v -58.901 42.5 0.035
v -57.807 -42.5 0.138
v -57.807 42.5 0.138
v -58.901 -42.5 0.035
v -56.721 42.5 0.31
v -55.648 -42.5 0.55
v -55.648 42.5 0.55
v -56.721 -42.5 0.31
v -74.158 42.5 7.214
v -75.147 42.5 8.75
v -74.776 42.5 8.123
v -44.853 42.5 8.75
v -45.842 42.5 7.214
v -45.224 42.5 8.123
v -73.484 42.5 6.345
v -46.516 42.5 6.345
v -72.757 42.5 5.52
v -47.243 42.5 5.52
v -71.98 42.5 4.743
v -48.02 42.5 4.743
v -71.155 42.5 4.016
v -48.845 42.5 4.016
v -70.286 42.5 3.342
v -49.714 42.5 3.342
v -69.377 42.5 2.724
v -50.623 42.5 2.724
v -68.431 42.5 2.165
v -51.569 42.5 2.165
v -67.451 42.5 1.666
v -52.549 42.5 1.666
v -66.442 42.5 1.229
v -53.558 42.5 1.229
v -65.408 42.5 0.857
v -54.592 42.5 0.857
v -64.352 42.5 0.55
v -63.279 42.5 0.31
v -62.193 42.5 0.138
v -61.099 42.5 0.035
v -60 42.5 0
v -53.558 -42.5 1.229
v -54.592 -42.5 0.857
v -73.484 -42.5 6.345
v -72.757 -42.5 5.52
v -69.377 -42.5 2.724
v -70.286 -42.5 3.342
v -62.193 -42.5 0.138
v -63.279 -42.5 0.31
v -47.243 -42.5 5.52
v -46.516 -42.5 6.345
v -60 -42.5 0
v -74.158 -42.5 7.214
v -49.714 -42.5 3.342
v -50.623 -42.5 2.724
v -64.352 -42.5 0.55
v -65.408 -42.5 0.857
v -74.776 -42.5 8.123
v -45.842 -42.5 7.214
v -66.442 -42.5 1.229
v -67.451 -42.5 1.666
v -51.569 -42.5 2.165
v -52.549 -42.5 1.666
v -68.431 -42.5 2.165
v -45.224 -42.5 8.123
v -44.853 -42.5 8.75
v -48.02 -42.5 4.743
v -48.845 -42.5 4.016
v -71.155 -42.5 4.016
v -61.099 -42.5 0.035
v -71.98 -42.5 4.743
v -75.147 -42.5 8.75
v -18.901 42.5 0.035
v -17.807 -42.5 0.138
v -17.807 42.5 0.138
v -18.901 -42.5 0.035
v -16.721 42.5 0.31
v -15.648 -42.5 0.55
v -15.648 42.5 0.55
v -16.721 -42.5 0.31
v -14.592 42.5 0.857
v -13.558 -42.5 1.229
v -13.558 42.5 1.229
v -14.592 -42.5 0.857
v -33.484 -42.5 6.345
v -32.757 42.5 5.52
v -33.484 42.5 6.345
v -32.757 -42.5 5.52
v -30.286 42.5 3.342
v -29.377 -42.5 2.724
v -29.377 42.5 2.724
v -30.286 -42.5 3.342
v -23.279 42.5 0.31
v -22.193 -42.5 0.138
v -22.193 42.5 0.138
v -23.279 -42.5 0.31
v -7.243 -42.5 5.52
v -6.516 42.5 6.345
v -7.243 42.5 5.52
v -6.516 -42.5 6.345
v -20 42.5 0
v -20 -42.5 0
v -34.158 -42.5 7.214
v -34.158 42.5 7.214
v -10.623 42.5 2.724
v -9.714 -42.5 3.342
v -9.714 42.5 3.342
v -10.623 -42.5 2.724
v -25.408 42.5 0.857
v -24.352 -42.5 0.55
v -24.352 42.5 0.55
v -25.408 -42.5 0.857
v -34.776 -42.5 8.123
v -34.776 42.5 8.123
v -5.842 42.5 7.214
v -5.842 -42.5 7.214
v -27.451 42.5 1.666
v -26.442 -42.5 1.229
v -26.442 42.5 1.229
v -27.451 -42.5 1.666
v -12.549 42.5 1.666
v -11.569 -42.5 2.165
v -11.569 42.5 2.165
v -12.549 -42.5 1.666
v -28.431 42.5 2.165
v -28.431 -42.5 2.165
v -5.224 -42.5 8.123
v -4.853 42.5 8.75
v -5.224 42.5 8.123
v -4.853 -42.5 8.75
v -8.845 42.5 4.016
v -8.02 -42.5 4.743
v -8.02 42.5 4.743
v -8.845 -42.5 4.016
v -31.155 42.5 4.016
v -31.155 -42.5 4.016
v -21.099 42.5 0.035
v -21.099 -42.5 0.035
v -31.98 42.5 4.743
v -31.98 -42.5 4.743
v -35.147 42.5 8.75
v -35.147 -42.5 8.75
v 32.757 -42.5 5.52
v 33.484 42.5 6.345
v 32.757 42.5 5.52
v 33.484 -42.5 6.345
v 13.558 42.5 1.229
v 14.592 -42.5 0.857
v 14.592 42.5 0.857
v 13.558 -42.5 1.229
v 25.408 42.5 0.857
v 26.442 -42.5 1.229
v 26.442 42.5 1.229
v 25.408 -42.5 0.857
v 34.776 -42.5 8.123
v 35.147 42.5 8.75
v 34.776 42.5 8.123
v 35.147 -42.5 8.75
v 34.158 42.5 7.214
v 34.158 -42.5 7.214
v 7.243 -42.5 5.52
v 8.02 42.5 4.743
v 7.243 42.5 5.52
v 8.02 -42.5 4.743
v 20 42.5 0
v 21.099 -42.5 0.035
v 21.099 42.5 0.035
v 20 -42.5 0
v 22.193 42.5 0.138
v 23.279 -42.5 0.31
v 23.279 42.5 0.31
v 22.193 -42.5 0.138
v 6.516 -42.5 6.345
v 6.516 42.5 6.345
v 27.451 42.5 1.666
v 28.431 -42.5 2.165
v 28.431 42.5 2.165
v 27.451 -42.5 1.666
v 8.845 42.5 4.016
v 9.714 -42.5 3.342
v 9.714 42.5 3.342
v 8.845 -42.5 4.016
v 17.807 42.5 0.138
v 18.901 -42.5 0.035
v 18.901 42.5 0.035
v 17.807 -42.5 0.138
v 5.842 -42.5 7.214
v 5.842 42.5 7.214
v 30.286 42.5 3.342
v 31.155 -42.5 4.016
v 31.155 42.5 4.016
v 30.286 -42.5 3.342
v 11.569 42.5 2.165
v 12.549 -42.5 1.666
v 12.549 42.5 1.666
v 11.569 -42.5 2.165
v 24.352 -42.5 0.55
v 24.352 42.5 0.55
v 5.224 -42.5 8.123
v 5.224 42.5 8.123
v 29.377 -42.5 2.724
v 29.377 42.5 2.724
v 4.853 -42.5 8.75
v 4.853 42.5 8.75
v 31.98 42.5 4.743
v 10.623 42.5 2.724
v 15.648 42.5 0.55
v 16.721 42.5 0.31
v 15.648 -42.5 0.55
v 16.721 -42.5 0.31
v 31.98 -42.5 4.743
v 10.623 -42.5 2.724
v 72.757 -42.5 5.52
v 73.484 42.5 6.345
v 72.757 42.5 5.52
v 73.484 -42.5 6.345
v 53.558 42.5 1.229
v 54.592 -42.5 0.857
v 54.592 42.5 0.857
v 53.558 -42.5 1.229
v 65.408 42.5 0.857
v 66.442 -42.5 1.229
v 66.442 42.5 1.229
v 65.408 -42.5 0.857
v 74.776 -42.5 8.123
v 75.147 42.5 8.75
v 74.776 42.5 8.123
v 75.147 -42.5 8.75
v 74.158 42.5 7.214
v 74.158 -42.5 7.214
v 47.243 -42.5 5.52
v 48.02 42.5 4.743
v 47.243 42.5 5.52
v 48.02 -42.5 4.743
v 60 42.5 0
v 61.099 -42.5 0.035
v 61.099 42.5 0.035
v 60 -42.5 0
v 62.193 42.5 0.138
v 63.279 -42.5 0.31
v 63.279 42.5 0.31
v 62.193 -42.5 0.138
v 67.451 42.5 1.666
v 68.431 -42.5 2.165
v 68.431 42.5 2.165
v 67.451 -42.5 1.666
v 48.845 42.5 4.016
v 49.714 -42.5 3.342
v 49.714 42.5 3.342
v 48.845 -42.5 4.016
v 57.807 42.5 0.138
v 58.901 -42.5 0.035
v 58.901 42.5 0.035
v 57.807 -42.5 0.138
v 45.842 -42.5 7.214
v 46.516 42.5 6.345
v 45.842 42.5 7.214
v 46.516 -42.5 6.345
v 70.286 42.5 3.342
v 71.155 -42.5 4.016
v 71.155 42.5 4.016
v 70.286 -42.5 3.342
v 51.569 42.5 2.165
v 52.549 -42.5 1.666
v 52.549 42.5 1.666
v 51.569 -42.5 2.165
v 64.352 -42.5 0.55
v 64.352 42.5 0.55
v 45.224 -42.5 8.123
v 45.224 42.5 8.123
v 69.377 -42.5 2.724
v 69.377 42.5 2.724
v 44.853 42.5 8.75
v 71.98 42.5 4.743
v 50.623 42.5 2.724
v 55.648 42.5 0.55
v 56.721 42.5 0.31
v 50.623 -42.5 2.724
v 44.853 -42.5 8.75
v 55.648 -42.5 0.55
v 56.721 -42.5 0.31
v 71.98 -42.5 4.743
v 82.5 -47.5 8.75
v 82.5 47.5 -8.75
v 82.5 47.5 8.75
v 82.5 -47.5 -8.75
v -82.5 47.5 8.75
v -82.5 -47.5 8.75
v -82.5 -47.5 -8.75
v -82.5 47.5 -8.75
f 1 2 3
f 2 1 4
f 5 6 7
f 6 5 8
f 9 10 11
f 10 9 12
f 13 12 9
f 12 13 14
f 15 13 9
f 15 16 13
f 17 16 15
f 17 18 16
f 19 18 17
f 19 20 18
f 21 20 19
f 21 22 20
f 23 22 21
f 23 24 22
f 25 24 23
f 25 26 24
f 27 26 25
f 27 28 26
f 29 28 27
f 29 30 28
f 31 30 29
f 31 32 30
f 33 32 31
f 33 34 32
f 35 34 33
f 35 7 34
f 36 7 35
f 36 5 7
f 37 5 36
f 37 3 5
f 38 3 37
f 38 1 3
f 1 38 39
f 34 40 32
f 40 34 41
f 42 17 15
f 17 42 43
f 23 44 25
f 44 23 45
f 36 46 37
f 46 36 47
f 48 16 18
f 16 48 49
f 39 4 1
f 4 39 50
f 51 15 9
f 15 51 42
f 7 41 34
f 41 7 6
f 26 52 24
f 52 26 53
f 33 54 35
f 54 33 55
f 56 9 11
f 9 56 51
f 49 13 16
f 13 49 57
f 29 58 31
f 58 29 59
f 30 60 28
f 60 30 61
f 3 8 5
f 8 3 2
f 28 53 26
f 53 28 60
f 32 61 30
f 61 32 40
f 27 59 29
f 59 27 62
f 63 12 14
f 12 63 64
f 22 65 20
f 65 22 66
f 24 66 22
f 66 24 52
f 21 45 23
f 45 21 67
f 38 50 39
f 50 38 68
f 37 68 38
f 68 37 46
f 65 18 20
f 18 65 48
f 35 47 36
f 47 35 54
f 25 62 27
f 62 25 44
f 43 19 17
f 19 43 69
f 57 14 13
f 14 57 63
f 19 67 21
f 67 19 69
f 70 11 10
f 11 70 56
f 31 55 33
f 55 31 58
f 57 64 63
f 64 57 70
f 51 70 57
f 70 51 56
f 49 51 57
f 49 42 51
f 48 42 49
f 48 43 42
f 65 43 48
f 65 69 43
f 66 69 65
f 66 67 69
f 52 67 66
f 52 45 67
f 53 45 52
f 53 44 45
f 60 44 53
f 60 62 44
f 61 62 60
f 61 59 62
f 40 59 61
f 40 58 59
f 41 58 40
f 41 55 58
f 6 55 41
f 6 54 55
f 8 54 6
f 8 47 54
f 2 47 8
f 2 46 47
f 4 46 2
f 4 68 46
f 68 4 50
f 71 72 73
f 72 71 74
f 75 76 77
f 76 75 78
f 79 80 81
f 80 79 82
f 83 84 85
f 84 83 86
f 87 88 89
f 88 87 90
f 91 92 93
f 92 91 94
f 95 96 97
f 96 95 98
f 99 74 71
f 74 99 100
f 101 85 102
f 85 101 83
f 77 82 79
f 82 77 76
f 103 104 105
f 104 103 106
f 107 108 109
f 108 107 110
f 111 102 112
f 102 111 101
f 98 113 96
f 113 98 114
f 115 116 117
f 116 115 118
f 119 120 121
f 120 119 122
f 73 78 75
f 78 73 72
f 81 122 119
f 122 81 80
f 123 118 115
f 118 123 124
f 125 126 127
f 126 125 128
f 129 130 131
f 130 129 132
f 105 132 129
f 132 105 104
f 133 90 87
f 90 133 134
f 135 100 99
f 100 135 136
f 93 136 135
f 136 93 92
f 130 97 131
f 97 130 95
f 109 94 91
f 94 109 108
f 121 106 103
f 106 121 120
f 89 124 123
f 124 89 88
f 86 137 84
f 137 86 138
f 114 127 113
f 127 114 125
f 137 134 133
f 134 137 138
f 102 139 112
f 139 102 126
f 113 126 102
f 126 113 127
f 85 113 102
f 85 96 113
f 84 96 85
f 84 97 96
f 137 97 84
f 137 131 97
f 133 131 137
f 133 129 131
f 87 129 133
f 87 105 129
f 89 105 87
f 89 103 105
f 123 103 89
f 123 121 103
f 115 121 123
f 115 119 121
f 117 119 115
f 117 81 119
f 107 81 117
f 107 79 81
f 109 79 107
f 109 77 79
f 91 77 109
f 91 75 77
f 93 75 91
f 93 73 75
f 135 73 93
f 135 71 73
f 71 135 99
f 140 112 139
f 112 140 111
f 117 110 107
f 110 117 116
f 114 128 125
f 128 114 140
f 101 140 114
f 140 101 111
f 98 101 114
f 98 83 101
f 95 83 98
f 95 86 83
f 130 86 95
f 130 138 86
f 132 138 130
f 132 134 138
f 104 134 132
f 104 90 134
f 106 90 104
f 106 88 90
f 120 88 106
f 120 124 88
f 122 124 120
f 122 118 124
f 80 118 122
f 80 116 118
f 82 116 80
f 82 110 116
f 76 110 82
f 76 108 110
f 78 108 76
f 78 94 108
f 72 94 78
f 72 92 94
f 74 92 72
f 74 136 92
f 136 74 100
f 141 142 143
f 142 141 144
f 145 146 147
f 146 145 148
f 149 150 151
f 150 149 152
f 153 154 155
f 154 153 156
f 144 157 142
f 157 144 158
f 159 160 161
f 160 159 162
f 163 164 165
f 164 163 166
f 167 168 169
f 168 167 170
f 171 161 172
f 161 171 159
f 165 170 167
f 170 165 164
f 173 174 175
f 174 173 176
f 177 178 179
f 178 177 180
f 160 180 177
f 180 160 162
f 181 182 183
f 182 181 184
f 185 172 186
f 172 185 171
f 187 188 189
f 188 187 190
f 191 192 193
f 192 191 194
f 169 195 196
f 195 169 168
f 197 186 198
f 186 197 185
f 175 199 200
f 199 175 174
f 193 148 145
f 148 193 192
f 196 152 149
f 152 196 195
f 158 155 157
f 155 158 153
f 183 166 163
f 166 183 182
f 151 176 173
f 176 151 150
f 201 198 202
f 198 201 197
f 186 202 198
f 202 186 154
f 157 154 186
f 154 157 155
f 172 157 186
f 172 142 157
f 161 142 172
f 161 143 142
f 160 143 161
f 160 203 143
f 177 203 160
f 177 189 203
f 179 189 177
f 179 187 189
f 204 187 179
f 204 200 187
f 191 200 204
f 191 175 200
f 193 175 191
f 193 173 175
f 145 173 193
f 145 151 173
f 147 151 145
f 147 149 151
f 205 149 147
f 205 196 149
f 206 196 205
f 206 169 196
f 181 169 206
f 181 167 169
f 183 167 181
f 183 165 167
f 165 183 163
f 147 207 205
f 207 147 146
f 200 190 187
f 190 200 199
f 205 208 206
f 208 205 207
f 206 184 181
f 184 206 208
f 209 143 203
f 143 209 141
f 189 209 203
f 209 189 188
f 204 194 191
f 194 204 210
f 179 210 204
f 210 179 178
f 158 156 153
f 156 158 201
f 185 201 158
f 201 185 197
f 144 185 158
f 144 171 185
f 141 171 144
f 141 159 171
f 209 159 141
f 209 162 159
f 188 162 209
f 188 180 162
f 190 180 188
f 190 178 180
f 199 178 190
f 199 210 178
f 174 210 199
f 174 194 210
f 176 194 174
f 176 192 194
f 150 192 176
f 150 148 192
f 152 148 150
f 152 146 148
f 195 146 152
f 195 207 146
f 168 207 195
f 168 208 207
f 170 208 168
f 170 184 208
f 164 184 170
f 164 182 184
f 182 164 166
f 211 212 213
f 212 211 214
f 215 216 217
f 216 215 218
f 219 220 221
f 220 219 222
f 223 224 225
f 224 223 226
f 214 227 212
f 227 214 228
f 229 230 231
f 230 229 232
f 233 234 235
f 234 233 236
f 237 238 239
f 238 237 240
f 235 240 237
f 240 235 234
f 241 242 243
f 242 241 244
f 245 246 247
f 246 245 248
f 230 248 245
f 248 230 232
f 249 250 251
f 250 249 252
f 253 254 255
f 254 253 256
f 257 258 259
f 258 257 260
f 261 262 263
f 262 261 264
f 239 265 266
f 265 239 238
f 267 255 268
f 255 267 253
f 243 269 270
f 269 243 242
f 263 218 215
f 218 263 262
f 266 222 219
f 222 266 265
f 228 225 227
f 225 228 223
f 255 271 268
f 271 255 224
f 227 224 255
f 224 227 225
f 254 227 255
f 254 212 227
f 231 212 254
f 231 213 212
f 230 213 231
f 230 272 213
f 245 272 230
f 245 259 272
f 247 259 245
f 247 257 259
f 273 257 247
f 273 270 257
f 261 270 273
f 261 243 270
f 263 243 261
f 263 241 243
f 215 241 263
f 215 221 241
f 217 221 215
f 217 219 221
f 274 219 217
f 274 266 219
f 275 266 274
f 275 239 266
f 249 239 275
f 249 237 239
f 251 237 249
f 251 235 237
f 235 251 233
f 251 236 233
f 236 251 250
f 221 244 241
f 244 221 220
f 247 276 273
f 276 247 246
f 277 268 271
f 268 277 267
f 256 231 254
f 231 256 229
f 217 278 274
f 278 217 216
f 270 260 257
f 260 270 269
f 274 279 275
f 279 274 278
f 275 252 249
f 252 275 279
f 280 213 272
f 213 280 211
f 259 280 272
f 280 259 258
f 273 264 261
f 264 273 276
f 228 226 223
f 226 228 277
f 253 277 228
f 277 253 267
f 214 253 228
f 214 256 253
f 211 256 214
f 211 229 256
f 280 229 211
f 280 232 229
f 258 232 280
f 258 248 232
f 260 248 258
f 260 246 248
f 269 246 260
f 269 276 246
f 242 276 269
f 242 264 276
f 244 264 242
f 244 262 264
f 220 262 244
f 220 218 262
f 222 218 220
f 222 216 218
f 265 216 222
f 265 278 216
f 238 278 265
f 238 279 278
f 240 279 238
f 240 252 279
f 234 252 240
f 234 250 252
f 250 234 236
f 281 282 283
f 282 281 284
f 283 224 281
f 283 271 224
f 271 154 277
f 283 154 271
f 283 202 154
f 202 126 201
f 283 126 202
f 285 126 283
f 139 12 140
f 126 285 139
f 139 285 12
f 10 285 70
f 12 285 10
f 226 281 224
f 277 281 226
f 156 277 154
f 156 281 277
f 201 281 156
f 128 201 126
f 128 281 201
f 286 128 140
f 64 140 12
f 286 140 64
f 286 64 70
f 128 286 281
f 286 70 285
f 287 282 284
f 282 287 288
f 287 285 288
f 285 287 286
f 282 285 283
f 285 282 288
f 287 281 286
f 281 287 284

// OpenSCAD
/***********************************************************************
Name ......... : bottleStand.scad
Description....: Customizable Small Bottle Stand
Author ....... : Garrett Melenka
Version ...... : V1.0 2016/12/31
Licence ...... : GPL
***********************************************************************/

//measured bottle diameter + a small clearance
bottleDiameter = 35.0;
//measured bottle height + a small clearance
bottleHeight = 85.0;

//number of bottles
numBottles = 4;

//Spacing around edges
edge = 10;
//Spacing Between Bottles
bottleSpace = 5;


module bottleStand()
{
    
    L = (bottleDiameter + bottleSpace)*numBottles + edge*0.5;
    
    difference(){
    cube([L, bottleHeight+edge, bottleDiameter*0.5], center = true);
    
    
    for(i=[0:1:numBottles-1]){
    
        
     x = -L*0.5 + (bottleDiameter*0.5+edge*0.5) + (bottleDiameter+bottleSpace)*i;
     //x=-L*0.5 + bottleDiameter-edge*0.5;   
        
    translate([x,0,bottleDiameter*0.5]){
    
    rotate([90,0,0]){
    cylinder(r=bottleDiameter*0.5, h=bottleHeight, center = true, $fn=100);
    }
    }
    }
    }
    
}






bottleStand();



